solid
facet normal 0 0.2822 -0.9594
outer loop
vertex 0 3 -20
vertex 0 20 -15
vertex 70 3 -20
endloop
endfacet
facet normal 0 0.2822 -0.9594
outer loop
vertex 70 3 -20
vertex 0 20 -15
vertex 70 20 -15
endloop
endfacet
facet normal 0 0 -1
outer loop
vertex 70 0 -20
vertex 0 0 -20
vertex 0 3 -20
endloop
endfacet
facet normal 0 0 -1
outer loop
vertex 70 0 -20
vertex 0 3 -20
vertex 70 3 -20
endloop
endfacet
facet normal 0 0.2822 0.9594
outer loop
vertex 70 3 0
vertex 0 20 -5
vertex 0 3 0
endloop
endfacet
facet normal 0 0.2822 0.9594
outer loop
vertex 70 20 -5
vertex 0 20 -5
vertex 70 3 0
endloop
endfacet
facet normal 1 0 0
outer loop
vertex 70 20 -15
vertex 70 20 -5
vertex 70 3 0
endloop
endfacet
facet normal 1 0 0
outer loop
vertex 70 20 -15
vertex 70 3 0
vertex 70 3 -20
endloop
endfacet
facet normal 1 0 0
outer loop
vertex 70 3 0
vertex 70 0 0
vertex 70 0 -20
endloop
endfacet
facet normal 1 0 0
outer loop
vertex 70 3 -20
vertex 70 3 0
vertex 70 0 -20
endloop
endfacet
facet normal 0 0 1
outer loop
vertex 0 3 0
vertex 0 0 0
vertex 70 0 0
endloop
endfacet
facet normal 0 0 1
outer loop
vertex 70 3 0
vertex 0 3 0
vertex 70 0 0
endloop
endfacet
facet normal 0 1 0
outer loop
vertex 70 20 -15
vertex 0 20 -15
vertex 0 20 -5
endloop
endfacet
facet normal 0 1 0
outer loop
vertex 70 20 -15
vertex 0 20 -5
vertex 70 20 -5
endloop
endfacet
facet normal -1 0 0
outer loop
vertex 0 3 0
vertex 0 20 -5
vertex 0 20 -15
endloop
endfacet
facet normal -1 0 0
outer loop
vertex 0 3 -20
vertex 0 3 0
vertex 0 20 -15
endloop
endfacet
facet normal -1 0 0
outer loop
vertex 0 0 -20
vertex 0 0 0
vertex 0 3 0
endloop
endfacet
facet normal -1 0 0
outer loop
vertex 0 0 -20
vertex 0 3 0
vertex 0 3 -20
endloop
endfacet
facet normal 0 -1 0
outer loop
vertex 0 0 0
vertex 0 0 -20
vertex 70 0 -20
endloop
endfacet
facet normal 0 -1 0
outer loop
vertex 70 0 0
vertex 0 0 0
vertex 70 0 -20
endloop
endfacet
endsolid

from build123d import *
from OCP.BRepFilletAPI import BRepFilletAPI_MakeChamfer

# Parameters (mm, degrees)
SKETCH1_W           = 70
SKETCH1_H           = 20
BOSS_EXTRUDE1_DEPTH = 20
CHAMFER1_SIZE       = 17
CHAMFER1_SIZE2      = 5


with BuildPart() as part:
    # Sketch1 → Boss-Extrude1 (new body)
    with BuildSketch(Plane(origin=(0, 0, 0), x_dir=(1, 0, 0), z_dir=(0, 1, 0))):
        with Locations((35, 10)):
            Rectangle(SKETCH1_W, SKETCH1_H)
    extrude(amount=BOSS_EXTRUDE1_DEPTH)

    # Chamfer1: one chamfer whose edges measure the first distance from different faces: ONE call of the kernel's chamfer builder (chamfer() names one face for all edges)
    chamfer1_edges_1 = [part.edges().sort_by_distance(p)[0] for p in [
        (35, 20, -20),
    ]]
    chamfer1_side_1 = [part.faces().sort_by_distance(p)[0] for p in [
        (35, 10, -20),
    ]]
    chamfer1_edges_2 = [part.edges().sort_by_distance(p)[0] for p in [
        (35, 20, 0),
    ]]
    chamfer1_side_2 = [part.faces().sort_by_distance(p)[0] for p in [
        (35, 10, 0),
    ]]
    chamfer1 = BRepFilletAPI_MakeChamfer(part.part.solid().wrapped)
    for e in chamfer1_edges_1:
        chamfer1.Add(CHAMFER1_SIZE, CHAMFER1_SIZE2, e.wrapped, chamfer1_side_1[0].wrapped)  # the first distance lies on this face
    for e in chamfer1_edges_2:
        chamfer1.Add(CHAMFER1_SIZE, CHAMFER1_SIZE2, e.wrapped, chamfer1_side_2[0].wrapped)  # the first distance lies on this face
    add(Compound.cast(chamfer1.Shape()), mode=Mode.REPLACE)


solid = part.part
